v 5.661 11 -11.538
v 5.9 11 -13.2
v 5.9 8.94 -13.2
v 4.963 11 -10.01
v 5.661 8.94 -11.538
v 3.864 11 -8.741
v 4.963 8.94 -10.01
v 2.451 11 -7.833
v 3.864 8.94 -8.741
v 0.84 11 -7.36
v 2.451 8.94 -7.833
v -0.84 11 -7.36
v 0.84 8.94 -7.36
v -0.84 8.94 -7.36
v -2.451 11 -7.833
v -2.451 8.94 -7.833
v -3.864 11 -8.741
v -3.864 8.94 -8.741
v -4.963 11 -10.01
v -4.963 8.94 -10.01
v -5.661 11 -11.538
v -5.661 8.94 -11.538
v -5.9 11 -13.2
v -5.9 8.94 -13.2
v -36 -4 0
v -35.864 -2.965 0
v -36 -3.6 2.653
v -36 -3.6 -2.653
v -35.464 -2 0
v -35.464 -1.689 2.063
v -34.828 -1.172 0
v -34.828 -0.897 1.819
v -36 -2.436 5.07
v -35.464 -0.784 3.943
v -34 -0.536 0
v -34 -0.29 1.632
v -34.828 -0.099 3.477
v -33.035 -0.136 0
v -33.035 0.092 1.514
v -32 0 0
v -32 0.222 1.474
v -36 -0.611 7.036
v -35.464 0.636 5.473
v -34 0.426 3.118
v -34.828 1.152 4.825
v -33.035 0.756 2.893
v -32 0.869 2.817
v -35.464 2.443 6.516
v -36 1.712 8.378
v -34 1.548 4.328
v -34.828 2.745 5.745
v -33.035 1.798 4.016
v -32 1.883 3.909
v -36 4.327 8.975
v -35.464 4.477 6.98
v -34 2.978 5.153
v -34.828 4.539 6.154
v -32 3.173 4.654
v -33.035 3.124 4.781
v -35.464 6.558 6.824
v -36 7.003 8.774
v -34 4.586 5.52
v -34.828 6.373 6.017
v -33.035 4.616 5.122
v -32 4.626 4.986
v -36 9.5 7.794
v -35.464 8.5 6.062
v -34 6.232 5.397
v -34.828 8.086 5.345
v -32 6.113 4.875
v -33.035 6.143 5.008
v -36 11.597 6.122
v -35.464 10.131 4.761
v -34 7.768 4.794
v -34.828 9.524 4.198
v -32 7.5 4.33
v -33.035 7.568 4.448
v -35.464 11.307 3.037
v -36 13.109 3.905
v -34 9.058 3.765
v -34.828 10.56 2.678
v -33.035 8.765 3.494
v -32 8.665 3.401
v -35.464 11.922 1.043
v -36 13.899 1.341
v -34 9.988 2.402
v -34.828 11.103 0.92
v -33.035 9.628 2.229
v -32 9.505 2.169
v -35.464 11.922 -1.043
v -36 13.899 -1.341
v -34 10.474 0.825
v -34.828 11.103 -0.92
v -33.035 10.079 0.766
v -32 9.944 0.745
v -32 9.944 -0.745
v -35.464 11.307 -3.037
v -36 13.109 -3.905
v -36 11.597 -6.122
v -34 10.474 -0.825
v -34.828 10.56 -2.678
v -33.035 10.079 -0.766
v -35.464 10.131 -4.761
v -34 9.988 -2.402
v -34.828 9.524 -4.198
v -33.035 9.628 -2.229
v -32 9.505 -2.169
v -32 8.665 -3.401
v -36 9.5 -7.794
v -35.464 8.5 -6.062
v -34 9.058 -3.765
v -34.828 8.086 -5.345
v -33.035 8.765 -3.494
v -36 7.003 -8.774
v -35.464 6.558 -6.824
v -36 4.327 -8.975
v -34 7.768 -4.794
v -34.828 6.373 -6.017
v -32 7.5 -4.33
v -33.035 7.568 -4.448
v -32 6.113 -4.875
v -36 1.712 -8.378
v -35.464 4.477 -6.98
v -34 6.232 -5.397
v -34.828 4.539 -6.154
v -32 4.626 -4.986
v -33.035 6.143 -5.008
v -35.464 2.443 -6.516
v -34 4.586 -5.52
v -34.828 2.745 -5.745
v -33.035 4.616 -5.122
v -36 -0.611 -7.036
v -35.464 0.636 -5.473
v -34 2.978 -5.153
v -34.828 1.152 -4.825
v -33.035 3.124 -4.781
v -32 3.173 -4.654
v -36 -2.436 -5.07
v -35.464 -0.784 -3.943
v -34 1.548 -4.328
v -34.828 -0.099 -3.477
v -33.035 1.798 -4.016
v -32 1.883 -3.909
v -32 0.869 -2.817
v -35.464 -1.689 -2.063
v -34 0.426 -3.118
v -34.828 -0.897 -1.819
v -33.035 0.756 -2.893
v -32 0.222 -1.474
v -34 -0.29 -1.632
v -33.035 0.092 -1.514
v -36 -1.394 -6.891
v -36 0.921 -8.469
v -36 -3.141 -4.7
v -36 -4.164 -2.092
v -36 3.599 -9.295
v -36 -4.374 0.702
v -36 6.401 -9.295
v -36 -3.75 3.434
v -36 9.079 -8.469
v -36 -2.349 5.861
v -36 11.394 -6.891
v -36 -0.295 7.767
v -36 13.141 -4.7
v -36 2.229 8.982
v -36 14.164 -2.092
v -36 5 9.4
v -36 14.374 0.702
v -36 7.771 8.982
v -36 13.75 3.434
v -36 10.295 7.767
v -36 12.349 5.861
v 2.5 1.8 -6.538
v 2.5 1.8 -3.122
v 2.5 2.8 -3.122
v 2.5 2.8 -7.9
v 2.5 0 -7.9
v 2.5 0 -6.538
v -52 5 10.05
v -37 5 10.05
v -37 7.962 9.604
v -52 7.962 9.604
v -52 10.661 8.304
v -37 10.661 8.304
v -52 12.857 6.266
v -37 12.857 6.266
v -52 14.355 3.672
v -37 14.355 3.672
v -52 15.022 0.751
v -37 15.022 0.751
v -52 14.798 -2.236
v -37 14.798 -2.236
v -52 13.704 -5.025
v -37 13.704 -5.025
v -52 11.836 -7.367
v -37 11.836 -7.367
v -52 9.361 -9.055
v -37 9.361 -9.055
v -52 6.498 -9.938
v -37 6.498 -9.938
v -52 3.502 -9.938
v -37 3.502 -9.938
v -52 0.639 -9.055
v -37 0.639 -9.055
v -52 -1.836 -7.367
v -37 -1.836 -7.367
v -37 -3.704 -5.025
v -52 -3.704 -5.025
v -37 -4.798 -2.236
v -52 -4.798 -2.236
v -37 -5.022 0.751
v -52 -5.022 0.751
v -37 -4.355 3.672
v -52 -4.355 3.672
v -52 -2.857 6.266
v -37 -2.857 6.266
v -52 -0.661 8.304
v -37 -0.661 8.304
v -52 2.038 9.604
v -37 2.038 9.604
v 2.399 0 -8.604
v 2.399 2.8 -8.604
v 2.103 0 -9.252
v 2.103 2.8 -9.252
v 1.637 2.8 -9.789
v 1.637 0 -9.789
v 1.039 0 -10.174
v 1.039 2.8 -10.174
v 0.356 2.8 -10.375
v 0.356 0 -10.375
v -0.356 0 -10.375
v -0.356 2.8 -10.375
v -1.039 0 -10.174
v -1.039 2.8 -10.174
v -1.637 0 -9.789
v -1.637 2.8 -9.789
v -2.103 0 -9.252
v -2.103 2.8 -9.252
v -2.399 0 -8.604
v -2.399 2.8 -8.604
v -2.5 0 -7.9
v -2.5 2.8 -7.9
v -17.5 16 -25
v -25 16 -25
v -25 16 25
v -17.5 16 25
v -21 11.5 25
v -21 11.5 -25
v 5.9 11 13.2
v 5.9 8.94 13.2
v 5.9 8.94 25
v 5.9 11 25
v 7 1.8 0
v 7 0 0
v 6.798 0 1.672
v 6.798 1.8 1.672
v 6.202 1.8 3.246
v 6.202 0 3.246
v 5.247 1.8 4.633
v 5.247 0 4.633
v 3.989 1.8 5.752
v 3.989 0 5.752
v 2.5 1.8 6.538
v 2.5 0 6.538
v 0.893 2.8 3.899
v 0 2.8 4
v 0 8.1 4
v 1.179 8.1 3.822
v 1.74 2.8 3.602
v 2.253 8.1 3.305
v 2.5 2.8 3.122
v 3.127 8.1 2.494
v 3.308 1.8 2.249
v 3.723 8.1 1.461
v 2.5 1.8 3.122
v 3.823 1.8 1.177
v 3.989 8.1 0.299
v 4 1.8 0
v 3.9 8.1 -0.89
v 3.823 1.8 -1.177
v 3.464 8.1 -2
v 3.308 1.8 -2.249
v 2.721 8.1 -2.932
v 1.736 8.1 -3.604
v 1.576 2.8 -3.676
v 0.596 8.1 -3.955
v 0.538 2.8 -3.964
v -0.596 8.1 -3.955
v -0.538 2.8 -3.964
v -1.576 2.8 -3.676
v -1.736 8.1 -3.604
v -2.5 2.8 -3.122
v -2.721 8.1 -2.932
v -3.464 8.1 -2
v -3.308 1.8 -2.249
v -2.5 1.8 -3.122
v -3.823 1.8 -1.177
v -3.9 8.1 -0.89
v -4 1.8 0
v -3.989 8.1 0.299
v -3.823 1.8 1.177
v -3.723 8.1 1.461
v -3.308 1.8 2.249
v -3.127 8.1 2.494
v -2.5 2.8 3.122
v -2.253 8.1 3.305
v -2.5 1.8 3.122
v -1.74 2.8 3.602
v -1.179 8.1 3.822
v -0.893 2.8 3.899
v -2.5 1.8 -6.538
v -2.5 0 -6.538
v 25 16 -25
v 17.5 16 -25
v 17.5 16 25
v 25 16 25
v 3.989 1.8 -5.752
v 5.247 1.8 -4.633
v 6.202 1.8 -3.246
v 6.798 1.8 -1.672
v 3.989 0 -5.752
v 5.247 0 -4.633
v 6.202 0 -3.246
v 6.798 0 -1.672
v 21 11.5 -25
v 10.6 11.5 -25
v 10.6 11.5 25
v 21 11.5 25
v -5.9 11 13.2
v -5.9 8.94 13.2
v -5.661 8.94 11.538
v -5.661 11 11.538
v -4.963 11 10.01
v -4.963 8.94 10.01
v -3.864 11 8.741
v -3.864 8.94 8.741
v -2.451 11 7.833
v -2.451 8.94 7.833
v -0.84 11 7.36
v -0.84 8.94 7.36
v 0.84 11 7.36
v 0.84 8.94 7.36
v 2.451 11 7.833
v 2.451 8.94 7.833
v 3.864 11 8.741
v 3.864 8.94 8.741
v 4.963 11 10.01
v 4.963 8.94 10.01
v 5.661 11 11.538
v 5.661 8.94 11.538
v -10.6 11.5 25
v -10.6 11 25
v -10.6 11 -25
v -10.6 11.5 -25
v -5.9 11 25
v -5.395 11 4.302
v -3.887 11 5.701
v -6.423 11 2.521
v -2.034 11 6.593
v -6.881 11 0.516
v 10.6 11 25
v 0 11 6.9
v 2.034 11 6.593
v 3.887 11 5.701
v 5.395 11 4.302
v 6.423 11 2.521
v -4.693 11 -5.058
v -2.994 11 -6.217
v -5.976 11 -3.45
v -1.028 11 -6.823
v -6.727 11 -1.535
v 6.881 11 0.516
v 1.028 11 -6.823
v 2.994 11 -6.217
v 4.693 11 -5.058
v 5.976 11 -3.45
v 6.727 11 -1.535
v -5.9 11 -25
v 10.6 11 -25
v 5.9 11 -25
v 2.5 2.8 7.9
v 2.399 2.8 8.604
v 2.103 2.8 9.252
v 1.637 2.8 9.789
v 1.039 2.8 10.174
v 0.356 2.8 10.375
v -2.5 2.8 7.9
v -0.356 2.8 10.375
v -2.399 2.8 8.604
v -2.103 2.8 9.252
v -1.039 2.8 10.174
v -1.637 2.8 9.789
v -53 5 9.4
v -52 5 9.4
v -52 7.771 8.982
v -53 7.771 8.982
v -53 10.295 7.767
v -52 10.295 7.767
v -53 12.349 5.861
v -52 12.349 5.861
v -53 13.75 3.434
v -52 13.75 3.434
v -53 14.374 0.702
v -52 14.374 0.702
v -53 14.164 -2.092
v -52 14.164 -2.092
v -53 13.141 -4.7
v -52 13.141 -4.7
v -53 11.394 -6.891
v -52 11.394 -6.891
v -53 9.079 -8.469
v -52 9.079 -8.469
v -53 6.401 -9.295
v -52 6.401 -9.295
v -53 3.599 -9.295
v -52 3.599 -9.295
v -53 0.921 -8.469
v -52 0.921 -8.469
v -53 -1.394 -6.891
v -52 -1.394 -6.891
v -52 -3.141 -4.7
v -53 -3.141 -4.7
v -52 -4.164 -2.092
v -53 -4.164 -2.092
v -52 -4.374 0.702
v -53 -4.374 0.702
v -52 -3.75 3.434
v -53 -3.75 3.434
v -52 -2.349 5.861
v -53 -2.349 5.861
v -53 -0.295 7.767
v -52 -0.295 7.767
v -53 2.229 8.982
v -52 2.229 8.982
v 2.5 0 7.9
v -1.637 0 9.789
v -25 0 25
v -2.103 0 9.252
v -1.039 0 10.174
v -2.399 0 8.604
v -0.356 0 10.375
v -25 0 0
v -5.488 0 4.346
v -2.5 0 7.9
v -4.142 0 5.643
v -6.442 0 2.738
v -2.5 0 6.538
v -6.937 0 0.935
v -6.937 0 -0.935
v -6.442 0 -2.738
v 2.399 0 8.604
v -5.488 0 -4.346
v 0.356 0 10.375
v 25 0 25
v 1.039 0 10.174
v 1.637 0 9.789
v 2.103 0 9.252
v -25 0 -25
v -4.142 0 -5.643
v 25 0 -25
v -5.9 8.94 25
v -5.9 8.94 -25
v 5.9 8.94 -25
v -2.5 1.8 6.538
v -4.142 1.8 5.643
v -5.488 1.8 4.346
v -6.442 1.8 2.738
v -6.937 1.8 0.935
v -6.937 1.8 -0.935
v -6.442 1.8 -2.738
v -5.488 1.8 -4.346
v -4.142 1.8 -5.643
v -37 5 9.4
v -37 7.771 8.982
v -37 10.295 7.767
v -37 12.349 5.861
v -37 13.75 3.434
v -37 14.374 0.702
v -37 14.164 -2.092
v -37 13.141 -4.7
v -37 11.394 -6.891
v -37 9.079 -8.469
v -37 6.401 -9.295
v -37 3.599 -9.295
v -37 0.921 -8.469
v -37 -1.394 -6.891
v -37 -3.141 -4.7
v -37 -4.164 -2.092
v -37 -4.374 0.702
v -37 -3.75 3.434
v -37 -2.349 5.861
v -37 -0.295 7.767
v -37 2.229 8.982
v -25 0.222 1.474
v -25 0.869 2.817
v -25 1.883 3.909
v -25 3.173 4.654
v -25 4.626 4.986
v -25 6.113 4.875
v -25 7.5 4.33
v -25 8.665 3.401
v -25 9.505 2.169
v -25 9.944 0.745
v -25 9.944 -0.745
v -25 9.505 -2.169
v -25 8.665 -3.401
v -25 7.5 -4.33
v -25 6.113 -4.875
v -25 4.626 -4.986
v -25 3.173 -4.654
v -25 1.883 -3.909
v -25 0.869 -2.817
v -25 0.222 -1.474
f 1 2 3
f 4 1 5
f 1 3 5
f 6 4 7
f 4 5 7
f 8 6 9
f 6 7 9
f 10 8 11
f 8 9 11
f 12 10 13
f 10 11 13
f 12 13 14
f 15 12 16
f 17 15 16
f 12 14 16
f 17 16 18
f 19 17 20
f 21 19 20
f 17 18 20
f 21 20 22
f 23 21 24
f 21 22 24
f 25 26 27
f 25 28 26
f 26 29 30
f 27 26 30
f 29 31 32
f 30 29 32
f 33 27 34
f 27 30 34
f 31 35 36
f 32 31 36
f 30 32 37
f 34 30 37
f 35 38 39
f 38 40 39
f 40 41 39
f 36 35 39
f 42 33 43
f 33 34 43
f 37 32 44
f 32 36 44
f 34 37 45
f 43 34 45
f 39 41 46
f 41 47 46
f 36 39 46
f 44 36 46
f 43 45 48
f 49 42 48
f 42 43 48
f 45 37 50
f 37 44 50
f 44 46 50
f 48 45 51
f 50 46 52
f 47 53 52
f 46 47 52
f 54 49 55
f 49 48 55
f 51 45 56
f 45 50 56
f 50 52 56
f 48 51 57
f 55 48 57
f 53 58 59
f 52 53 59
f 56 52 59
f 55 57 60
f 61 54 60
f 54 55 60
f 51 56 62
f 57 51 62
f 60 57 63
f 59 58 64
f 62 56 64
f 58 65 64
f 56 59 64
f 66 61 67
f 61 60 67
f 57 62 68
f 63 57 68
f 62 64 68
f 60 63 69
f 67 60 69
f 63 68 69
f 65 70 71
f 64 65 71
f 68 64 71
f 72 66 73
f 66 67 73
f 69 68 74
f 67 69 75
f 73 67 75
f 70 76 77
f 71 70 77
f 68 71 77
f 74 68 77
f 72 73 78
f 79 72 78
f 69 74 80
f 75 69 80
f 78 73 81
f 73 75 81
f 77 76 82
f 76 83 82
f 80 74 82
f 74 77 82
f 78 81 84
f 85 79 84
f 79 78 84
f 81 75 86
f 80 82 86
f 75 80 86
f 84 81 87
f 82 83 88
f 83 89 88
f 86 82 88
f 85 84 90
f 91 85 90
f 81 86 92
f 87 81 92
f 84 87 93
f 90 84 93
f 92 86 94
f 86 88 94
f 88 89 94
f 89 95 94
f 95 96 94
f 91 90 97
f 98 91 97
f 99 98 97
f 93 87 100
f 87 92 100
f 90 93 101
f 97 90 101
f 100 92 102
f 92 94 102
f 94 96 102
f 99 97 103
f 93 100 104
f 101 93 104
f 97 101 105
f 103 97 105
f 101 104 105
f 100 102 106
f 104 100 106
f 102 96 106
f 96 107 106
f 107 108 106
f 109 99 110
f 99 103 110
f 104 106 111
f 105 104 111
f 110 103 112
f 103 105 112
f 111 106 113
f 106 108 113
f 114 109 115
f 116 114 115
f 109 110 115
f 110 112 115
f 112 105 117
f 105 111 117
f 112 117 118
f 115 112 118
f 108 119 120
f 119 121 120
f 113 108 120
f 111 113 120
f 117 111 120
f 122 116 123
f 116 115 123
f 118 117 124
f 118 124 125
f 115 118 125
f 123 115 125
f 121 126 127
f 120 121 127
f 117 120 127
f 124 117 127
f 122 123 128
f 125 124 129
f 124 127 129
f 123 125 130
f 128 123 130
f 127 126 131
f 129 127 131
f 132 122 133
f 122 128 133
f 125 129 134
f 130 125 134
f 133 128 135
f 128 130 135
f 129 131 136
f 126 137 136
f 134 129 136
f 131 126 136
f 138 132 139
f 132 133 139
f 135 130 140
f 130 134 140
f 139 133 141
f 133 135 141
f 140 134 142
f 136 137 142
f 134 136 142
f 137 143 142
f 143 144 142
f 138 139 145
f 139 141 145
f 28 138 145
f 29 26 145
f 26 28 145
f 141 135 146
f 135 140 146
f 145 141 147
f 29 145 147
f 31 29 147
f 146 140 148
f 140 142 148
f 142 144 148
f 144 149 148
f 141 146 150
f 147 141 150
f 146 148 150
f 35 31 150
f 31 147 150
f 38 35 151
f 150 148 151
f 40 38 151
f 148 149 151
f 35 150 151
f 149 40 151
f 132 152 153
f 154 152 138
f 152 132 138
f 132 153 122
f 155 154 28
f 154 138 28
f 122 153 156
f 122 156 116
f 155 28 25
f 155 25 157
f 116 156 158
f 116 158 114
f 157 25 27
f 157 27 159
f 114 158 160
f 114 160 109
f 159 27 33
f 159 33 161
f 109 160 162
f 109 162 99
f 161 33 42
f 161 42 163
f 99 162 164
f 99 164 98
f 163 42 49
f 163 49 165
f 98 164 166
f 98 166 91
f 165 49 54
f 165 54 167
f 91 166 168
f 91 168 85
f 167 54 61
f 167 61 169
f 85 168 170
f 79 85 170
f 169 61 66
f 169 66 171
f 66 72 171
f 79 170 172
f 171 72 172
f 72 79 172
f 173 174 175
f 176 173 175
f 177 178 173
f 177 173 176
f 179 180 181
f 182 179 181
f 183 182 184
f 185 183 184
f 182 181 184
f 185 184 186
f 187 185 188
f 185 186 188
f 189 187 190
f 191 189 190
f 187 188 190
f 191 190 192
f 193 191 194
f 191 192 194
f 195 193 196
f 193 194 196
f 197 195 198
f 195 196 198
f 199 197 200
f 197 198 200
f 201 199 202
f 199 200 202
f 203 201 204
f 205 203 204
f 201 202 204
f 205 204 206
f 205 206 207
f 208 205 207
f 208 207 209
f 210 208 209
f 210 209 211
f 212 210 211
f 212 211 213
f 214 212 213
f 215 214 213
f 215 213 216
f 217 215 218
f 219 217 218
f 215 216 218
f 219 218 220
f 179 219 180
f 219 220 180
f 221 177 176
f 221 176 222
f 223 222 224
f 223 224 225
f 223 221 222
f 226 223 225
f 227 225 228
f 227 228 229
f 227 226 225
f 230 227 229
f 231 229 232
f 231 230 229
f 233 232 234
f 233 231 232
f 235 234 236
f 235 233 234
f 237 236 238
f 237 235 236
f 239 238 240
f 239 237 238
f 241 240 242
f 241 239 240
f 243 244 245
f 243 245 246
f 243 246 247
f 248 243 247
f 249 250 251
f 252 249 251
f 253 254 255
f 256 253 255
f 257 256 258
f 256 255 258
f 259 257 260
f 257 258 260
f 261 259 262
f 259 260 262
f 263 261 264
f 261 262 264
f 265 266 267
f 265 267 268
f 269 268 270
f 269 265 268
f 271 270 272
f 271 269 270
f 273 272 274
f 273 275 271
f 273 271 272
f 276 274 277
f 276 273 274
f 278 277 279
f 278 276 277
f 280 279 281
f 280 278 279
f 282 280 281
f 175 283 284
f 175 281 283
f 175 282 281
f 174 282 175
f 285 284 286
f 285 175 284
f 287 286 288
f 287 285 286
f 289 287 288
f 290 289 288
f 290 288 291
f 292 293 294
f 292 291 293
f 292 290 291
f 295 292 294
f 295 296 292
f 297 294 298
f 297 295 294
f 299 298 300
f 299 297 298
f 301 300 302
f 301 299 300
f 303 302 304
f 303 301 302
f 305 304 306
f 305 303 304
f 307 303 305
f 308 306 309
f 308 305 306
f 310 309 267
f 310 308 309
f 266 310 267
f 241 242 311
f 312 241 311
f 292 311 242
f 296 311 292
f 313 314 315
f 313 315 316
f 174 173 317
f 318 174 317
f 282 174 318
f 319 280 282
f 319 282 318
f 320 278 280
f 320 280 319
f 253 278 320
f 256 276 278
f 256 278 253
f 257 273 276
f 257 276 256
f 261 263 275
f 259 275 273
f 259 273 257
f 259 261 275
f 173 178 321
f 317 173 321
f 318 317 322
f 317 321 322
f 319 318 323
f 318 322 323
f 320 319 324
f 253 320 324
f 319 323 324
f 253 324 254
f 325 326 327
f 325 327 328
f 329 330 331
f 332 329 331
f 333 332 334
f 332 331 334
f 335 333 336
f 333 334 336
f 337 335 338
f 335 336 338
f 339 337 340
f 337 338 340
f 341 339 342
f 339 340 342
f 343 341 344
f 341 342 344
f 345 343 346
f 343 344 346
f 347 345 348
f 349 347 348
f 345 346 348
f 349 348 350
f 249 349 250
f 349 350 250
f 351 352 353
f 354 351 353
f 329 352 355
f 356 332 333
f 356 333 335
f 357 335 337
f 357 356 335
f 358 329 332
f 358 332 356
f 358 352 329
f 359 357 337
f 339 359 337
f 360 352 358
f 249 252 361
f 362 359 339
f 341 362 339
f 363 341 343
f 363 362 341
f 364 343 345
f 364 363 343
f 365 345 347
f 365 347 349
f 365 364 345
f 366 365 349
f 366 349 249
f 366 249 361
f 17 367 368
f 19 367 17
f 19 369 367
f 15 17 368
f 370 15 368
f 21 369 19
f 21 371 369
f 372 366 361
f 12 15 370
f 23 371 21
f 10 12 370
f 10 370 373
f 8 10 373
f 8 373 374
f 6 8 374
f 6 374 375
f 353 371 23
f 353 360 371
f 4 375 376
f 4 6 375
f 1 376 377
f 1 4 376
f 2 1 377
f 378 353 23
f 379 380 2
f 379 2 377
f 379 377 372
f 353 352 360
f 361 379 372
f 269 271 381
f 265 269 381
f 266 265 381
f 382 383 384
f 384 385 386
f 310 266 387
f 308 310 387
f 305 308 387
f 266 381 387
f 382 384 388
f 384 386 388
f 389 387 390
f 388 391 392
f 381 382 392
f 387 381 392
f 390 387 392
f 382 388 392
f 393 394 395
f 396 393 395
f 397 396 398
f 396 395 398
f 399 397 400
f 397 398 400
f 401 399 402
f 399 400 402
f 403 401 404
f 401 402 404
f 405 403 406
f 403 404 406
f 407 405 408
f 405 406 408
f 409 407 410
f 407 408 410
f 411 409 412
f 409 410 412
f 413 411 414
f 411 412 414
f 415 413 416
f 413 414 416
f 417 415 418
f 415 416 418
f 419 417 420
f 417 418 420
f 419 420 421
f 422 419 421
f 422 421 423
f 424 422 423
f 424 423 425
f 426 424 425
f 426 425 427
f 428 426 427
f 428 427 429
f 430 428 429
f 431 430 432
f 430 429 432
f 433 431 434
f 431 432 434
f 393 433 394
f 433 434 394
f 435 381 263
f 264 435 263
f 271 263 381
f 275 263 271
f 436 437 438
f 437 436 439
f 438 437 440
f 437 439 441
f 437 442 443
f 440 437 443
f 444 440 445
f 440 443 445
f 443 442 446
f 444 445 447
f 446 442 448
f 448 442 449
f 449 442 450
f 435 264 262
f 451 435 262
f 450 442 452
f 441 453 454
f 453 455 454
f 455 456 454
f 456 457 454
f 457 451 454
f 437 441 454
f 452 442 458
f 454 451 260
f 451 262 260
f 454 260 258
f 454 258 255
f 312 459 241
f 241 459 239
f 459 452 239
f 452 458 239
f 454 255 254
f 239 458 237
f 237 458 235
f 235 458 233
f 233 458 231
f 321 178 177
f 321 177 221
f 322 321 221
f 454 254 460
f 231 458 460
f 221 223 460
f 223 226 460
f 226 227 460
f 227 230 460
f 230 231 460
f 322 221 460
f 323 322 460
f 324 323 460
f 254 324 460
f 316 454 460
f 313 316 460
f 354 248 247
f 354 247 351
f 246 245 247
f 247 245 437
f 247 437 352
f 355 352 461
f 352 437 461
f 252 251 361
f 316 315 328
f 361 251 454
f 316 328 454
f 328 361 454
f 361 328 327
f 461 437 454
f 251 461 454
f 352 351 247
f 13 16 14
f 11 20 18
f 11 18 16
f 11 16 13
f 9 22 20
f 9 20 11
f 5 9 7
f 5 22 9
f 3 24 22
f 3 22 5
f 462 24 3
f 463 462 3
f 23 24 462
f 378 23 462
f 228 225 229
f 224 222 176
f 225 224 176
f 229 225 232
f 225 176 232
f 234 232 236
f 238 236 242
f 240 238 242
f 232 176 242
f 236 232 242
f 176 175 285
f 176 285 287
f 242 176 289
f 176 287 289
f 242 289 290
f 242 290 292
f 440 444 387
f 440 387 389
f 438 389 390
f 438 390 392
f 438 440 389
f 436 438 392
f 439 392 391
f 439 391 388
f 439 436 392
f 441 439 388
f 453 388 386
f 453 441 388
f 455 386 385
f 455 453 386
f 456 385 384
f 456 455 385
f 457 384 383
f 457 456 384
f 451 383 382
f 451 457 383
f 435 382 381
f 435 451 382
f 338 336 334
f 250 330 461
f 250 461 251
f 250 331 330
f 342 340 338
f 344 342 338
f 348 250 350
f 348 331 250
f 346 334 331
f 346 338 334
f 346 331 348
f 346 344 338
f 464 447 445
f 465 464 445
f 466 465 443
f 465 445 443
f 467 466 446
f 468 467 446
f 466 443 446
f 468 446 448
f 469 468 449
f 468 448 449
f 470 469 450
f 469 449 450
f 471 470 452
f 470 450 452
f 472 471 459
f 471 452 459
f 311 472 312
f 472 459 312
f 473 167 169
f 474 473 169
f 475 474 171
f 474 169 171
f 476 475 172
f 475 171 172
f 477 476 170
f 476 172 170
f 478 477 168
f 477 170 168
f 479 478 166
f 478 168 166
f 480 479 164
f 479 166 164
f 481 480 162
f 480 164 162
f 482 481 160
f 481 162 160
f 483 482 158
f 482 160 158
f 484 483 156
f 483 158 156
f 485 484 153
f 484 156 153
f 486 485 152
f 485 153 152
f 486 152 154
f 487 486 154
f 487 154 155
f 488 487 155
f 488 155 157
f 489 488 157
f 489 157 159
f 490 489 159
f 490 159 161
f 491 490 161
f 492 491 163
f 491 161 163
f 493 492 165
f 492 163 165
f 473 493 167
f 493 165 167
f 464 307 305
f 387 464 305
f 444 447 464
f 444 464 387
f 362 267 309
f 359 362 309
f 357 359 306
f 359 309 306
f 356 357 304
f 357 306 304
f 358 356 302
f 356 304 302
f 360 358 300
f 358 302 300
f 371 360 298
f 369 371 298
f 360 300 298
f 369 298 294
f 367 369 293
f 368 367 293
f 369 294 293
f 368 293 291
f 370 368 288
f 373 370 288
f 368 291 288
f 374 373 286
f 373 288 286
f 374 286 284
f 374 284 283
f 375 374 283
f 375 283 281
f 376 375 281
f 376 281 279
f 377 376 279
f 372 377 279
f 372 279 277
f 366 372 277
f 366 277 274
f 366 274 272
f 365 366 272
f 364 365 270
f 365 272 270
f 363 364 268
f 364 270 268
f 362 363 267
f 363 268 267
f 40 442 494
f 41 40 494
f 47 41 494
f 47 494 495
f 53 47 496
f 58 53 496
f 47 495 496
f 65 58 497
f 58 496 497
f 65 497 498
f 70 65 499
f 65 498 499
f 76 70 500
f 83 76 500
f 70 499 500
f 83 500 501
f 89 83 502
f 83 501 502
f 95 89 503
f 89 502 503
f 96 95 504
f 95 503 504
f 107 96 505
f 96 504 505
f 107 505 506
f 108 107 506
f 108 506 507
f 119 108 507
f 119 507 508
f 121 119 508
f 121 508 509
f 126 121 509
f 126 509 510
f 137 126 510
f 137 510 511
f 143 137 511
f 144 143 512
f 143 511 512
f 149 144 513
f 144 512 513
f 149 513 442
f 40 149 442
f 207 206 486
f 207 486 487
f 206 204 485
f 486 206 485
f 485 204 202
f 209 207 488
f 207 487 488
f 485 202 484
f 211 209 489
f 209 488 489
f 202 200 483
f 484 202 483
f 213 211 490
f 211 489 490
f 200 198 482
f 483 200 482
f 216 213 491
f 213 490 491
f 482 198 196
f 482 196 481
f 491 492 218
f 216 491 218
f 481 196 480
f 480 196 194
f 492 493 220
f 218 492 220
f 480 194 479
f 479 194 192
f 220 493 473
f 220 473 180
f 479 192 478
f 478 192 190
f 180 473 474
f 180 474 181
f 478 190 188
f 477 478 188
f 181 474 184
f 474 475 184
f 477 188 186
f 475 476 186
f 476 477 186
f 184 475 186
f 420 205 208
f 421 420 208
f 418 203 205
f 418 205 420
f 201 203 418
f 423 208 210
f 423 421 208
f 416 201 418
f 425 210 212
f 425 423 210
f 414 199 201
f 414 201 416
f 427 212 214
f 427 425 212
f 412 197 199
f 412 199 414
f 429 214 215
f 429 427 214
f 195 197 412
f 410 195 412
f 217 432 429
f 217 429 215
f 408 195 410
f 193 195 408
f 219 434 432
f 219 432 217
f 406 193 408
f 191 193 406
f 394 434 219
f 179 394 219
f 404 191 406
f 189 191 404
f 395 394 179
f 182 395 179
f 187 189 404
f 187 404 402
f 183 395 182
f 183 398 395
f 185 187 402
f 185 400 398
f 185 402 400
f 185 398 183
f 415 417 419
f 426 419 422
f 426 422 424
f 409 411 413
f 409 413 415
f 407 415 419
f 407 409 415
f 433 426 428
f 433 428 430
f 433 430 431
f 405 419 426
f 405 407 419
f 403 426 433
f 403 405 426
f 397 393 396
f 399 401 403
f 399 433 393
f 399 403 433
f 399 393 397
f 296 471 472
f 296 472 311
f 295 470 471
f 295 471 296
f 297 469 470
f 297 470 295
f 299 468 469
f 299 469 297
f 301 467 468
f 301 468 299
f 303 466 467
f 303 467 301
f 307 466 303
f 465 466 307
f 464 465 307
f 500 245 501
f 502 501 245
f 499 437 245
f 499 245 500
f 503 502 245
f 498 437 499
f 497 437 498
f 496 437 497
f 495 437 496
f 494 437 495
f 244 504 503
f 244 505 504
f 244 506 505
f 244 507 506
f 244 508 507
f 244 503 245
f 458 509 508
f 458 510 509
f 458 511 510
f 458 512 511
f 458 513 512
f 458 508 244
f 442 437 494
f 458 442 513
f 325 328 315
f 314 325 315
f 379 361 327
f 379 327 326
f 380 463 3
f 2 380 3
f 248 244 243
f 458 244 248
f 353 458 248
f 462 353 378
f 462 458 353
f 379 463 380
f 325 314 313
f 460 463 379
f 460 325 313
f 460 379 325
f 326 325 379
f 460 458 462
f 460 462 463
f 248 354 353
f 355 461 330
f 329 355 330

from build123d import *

# Parameters (mm, degrees)
SKETCH_1_R          = 5.9
EXTRUDE_1_DEPTH     = 8.94
SKETCH_1_4_R        = 4
EXTRUDE_2_DEPTH     = 11
SKETCH_1_5_W        = 14.4
SKETCH_1_5_H        = 50
EXTRUDE_3_DEPTH     = 16
CUT_EXTRUDE_1_DEPTH = 59.14636704
SKETCH_4_R          = 5
EXTRUDE_4_DEPTH     = 11
SKETCH_5_R          = 9.4
EXTRUDE_5_DEPTH     = 1
SKETCH_6_R          = 10.05
EXTRUDE_6_DEPTH     = 15
SKETCH_7_R          = 9.4
EXTRUDE_7_DEPTH     = 1
FILLET_1_R          = 4
CUT_EXTRUDE_3_DEPTH = 1.8
CUT_EXTRUDE_4_DEPTH = 2.8


with BuildPart() as part:
    # 草图1 → 凸台-拉伸1 (new body)
    with BuildSketch(Plane(origin=(0, 0, 0), x_dir=(1, 0, 0), z_dir=(0, 1, 0))):
        with BuildLine():
            Line((-5.9, -13.2), (-5.9, -25))
            Line((-5.9, -25), (5.9, -25))
            Line((5.9, -25), (5.9, -13.2))
            ThreePointArc((5.9, -13.2), (0, -19.1), (-5.9, -13.2))
        make_face()
        with Locations((0, -13.2)):
            Circle(SKETCH_1_R)
        with Locations((0, 13.2)):
            Circle(SKETCH_1_R)
        with BuildLine():
            Line((-5.9, 25), (-5.9, 13.2))
            ThreePointArc((-5.9, 13.2), (0, 19.1), (5.9, 13.2))
            Line((5.9, 13.2), (5.9, 25))
            Line((5.9, 25), (-5.9, 25))
        make_face()
    extrude(amount=EXTRUDE_1_DEPTH)

    # 草图1<4> → 凸台-拉伸2 (add)
    with BuildSketch(Plane(origin=(0, 0, 0), x_dir=(1, 0, 0), z_dir=(0, 1, 0))):
        with BuildLine():
            ThreePointArc((5.9, 13.2), (0, 7.3), (-5.9, 13.2))
            Line((-5.9, 13.2), (-5.9, 25))
            Line((-5.9, 25), (-10.6, 25))
            Line((-10.6, 25), (-10.6, -25))
            Line((-10.6, -25), (-5.9, -25))
            Line((-5.9, -25), (-5.9, -13.2))
            ThreePointArc((-5.9, -13.2), (0, -7.3), (5.9, -13.2))
            Line((5.9, -13.2), (5.9, -25))
            Line((5.9, -25), (10.6, -25))
            Line((10.6, -25), (10.6, 25))
            Line((10.6, 25), (5.9, 25))
            Line((5.9, 25), (5.9, 13.2))
        make_face()
        with Locations(Location((0, 0, 0), (0, 0, 270))):
            Circle(SKETCH_1_4_R, mode=Mode.SUBTRACT)
    extrude(amount=EXTRUDE_2_DEPTH)

    # 草图1<5> → 凸台-拉伸3 (add)
    with BuildSketch(Plane(origin=(0, 0, 0), x_dir=(1, 0, 0), z_dir=(0, 1, 0))):
        with Locations((17.8, 0)):
            Rectangle(SKETCH_1_5_W, SKETCH_1_5_H)
        with Locations((-17.8, 0)):
            Rectangle(SKETCH_1_5_W, SKETCH_1_5_H)
    extrude(amount=EXTRUDE_3_DEPTH)

    # 草图2 → 切除-拉伸1 (cut, through all)
    with BuildSketch(Plane.XY.offset(25)):
        Polygon((-17.5, 16), (-21, 11.5), (21, 11.5), (17.5, 16), align=None)
    extrude(amount=-CUT_EXTRUDE_1_DEPTH, mode=Mode.SUBTRACT)

    # 切除-拉伸2 cone 1 section (through the dimple's axis) → 切除-拉伸2 (revolve, cut)
    with BuildSketch(Plane(origin=(0, 11, 0), x_dir=(0, 0, 1), z_dir=(1, 0, 0))):
        Polygon((0, 0), (6.9, 0), (0, 6.9), align=None)
    revolve(axis=Axis((0, 11, 0), (0, -1, 0)), mode=Mode.SUBTRACT)

    # 草图4 → 凸台-拉伸4 (add)
    with BuildSketch(Plane.ZY.offset(25)):
        with Locations(Location((0, 5, 0), (0, 0, 270))):
            Circle(SKETCH_4_R)
    extrude(amount=EXTRUDE_4_DEPTH)

    # 草图5 → 凸台-拉伸5 (add)
    with BuildSketch(Plane.ZY.offset(36)):
        with Locations((0, 5)):
            Circle(SKETCH_5_R)
    extrude(amount=EXTRUDE_5_DEPTH)

    # 草图6 → 凸台-拉伸6 (add)
    with BuildSketch(Plane.ZY.offset(37)):
        with Locations((0, 5)):
            Circle(SKETCH_6_R)
    extrude(amount=EXTRUDE_6_DEPTH)

    # 草图7 → 凸台-拉伸7 (add)
    with BuildSketch(Plane.ZY.offset(52)):
        with Locations((0, 5)):
            Circle(SKETCH_7_R)
    extrude(amount=EXTRUDE_7_DEPTH)

    # 圆角1
    fillet_1_edges = [part.edges().sort_by_distance(p)[0] for p in [
        (-36, 10, 0),
    ]]
    fillet(fillet_1_edges, radius=FILLET_1_R)

    # 草图8 → 切除-拉伸3 (cut)
    with BuildSketch(Plane.XZ):
        with BuildLine():
            Line((-2.5, 3.122498999), (-2.5, 6.538348415))
            ThreePointArc((-2.5, 6.538348415), (-7, 0), (-2.5, -6.538348415))
            Line((-2.5, -6.538348415), (-2.5, -3.122498999))
            ThreePointArc((-2.5, -3.122498999), (-4, 0), (-2.5, 3.122498999))
        make_face()
        with BuildLine():
            ThreePointArc((7, 0), (5.766281297, 3.968626967), (2.5, 6.538348415))
            Line((2.5, 6.538348415), (2.5, 3.122498999))
            ThreePointArc((2.5, 3.122498999), (3.605551275, 1.732050808), (4, 0))
            ThreePointArc((4, 0), (3.605551275, -1.732050808), (2.5, -3.122498999))
            Line((2.5, -3.122498999), (2.5, -6.538348415))
            ThreePointArc((2.5, -6.538348415), (5.766281297, -3.968626967), (7, 0))
        make_face()
    extrude(amount=-CUT_EXTRUDE_3_DEPTH, mode=Mode.SUBTRACT)

    # 草图8<3> → 切除-拉伸4 (cut)
    with BuildSketch(Plane.XZ):
        with BuildLine():
            Line((2.5, 7.9), (2.5, -7.9))
            ThreePointArc((2.5, -7.9), (0, -10.4), (-2.5, -7.9))
            Line((-2.5, -7.9), (-2.5, 7.9))
            ThreePointArc((-2.5, 7.9), (0, 10.4), (2.5, 7.9))
        make_face()
    extrude(amount=-CUT_EXTRUDE_4_DEPTH, mode=Mode.SUBTRACT)


solid = part.part
